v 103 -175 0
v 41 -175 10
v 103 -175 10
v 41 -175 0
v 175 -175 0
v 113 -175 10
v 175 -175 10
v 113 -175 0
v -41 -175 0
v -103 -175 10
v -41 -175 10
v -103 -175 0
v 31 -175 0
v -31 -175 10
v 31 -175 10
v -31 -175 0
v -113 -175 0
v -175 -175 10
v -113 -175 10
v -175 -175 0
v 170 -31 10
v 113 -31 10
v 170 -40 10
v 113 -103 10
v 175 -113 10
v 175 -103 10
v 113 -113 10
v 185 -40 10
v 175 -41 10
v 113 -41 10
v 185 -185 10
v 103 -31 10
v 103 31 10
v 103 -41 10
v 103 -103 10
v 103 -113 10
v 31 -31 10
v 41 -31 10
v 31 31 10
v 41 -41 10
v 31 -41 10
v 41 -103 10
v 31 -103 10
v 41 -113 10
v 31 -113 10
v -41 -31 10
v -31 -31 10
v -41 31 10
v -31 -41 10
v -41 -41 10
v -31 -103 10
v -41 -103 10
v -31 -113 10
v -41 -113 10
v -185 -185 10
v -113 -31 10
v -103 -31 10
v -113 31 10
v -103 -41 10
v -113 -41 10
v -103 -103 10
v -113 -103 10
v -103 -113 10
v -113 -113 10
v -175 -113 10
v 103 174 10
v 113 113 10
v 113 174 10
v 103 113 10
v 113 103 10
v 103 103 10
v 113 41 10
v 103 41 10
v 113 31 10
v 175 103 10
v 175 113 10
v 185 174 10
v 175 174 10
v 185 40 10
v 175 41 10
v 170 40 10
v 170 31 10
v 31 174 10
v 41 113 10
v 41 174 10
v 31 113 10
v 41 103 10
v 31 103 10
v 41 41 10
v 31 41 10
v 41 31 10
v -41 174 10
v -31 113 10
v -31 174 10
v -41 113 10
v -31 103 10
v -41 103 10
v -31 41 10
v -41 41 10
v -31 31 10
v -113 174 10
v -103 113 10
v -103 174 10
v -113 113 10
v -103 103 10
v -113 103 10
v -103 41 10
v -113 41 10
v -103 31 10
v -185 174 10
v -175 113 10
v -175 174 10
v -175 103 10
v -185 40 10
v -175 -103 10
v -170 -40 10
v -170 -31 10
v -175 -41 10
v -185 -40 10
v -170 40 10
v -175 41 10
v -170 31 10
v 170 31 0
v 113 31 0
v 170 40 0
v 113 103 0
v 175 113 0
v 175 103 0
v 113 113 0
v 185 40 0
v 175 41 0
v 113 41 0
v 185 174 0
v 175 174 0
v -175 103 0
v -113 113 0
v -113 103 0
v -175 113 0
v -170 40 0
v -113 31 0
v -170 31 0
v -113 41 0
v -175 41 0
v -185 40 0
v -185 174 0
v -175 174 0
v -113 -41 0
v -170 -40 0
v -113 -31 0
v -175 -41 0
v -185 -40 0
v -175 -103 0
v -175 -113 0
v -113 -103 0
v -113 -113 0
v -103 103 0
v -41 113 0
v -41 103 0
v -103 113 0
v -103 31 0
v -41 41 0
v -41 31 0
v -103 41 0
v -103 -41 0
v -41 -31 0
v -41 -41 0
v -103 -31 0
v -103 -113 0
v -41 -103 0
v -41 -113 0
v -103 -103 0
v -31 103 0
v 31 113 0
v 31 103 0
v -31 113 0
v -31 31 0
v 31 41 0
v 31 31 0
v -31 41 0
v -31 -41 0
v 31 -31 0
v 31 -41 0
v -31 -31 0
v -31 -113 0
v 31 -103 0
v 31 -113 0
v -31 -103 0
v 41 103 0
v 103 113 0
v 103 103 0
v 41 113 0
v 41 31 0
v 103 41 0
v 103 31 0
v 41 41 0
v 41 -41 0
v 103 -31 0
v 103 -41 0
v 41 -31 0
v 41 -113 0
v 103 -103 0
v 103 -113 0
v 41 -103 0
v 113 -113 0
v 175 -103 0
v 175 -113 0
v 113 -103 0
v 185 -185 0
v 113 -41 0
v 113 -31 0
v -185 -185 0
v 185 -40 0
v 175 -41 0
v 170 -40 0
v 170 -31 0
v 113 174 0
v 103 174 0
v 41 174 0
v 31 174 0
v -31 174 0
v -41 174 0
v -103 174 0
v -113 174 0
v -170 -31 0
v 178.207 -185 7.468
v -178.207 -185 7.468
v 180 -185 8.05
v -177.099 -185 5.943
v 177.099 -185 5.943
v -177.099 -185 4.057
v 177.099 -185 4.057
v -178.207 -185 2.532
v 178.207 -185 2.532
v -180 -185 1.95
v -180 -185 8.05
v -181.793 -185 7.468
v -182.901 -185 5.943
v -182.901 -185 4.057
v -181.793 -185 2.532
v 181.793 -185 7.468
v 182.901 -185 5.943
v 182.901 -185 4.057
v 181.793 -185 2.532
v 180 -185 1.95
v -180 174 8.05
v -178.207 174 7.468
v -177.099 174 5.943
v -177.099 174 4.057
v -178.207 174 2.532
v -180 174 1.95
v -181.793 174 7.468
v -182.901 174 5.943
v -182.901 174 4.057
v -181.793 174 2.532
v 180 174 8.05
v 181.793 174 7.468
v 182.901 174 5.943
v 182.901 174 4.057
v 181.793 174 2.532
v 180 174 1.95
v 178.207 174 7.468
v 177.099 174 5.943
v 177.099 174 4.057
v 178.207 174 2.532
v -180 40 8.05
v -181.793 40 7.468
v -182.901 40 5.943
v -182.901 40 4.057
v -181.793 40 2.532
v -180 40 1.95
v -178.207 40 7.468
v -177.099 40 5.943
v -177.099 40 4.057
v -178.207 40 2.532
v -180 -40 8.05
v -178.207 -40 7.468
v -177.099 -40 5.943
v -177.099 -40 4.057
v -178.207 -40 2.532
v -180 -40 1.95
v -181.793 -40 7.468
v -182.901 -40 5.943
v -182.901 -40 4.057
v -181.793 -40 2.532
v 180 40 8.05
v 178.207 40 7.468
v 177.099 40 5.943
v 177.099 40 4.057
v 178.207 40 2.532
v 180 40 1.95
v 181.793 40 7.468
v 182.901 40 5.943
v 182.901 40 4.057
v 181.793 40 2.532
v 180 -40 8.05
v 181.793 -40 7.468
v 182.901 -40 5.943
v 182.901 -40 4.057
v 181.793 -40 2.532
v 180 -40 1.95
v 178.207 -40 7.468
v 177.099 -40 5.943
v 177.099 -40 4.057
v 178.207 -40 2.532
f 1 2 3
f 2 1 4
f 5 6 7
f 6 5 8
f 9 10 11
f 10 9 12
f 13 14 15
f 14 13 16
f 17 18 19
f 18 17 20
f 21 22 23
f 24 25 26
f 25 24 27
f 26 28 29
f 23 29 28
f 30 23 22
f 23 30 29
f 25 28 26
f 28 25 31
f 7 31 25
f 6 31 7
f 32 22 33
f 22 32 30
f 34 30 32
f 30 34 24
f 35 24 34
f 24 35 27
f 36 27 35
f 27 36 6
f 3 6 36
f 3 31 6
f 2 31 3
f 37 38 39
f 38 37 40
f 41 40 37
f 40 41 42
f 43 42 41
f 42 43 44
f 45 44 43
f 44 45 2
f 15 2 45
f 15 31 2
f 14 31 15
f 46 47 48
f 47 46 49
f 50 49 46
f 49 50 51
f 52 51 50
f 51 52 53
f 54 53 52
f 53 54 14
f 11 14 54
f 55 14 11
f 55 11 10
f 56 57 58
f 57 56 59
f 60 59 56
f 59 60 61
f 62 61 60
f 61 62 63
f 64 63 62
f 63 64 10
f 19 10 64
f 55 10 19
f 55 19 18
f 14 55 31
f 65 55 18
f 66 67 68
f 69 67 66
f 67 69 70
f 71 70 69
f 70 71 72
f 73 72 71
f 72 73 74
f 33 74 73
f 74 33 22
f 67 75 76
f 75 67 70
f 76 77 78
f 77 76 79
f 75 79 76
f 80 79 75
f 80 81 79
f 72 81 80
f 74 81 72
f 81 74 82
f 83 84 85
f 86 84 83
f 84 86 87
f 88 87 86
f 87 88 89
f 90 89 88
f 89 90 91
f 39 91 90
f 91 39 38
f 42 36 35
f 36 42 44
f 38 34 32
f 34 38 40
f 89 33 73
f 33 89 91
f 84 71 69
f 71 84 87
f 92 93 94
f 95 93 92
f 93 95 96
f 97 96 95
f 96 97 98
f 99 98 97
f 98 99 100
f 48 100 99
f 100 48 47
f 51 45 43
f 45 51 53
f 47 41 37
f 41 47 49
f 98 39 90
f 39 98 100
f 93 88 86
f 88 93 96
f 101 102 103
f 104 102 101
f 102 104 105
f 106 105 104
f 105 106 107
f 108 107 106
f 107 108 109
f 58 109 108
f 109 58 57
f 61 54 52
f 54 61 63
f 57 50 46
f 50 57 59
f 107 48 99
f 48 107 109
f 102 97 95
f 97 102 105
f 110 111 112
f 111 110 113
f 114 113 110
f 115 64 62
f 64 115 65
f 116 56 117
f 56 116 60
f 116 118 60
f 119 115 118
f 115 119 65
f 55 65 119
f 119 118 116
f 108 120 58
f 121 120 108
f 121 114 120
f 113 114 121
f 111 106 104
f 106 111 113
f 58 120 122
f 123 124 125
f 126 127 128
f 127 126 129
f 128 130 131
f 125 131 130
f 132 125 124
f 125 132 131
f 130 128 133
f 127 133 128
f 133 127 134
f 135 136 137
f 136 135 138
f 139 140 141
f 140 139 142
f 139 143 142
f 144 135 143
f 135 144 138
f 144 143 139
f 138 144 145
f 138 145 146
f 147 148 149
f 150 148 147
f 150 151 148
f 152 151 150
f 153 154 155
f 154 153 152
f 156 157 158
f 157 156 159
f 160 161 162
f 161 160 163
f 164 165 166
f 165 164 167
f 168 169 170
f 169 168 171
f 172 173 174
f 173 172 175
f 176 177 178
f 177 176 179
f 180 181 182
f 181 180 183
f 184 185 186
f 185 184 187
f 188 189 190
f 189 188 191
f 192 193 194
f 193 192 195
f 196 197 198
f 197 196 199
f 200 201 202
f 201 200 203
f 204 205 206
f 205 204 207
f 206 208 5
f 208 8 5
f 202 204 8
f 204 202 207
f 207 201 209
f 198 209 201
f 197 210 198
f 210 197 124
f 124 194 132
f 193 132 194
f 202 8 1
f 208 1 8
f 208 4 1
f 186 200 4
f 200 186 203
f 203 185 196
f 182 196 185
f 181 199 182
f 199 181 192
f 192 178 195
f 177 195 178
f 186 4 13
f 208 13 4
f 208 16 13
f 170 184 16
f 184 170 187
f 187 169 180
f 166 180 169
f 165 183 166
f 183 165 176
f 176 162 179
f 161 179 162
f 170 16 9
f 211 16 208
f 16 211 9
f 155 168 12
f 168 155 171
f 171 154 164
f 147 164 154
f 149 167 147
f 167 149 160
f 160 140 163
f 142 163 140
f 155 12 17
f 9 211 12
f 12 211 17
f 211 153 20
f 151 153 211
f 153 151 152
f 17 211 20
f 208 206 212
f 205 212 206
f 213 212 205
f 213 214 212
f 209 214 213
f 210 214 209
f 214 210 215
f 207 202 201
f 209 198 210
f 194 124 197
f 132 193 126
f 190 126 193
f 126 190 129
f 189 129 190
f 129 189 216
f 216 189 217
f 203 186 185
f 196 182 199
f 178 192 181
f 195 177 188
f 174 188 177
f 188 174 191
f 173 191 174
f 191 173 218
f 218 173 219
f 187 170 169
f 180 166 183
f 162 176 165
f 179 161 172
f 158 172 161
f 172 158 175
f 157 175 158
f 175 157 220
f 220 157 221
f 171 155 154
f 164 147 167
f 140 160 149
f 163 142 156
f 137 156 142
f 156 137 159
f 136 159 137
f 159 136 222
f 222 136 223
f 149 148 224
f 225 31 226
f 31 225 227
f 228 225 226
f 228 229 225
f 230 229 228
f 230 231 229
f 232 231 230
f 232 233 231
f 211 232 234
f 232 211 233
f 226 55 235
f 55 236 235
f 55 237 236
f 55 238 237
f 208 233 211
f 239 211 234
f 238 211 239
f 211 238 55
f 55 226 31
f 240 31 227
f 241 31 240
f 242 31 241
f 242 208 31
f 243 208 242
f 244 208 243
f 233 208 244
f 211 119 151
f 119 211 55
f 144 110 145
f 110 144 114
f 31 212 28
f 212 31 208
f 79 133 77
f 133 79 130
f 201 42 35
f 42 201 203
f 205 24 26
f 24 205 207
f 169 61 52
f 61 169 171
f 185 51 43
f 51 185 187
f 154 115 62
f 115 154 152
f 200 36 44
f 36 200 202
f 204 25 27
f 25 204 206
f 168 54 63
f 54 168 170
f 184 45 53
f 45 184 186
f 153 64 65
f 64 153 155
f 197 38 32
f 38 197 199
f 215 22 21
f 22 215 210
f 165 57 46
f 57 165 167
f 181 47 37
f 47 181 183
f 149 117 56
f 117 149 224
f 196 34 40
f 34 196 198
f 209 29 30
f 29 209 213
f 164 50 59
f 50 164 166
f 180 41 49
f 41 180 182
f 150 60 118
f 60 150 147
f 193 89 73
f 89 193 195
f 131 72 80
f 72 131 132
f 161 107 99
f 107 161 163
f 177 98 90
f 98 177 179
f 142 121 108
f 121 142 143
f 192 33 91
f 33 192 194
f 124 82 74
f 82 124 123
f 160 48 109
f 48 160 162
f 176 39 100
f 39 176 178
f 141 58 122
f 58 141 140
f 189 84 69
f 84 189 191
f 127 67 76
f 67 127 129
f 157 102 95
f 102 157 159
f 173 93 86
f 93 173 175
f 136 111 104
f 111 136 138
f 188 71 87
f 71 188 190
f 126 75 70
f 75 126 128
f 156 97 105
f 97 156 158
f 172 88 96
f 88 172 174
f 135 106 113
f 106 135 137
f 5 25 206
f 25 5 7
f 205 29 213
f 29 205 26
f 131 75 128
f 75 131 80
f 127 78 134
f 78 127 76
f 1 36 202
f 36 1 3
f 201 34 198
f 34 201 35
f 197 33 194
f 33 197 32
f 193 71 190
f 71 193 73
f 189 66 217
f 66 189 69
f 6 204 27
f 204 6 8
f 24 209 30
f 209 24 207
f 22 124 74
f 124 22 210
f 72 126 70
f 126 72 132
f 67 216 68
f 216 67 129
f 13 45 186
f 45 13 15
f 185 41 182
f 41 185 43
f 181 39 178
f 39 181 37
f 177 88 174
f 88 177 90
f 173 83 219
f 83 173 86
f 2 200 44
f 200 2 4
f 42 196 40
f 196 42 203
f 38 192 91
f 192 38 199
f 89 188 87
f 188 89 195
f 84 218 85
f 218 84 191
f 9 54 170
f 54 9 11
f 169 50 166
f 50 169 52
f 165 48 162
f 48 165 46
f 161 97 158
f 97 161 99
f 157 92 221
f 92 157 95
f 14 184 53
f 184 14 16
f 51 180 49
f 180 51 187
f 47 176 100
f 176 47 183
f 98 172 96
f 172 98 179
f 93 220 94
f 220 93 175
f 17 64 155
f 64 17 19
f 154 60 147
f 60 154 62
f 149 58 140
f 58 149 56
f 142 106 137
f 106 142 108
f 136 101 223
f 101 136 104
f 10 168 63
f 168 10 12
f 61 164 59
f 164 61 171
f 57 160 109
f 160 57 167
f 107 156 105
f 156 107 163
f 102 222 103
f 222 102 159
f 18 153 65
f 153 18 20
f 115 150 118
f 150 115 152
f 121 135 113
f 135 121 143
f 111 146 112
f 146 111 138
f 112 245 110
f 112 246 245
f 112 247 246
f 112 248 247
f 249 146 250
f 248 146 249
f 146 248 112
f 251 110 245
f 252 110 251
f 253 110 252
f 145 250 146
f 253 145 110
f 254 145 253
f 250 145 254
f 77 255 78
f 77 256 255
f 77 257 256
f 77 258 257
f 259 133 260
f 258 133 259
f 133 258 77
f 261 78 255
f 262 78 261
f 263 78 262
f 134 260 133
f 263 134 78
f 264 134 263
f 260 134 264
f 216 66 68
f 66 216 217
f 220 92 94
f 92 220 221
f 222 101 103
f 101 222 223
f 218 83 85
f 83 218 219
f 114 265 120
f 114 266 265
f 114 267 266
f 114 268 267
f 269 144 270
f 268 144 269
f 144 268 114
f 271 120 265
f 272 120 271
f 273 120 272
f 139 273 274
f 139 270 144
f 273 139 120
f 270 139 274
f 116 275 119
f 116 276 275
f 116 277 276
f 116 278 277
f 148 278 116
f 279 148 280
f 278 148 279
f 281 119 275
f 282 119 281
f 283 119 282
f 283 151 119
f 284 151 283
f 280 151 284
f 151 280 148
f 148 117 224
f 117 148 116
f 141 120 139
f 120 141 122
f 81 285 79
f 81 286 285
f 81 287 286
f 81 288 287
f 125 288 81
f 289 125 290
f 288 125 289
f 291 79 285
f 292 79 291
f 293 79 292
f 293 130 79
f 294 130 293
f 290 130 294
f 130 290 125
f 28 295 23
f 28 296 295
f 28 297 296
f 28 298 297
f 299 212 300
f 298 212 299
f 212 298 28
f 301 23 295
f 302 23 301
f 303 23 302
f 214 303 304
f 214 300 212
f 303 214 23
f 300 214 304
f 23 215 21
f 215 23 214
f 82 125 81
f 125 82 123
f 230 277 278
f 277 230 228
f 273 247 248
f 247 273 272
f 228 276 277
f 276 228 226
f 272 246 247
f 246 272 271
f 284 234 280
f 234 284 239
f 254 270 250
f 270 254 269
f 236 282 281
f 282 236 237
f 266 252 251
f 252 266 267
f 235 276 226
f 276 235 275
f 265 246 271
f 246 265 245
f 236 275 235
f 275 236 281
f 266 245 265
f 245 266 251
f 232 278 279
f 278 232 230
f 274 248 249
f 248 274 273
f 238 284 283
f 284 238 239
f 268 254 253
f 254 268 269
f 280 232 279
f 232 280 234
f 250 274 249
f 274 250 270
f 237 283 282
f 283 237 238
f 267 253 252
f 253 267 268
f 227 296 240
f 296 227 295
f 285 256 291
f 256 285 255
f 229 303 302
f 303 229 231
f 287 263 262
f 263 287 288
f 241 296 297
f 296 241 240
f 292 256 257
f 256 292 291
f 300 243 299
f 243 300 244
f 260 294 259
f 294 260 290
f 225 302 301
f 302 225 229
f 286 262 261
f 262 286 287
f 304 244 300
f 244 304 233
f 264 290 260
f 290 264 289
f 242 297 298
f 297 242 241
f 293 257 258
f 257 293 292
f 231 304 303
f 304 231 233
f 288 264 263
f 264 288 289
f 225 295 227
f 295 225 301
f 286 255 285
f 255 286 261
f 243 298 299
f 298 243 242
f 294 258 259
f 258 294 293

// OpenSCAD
rotate([0, 0, 90]) translate([0, 0, 5]) difference()
{
  union()
  {
    for(x = [-370 / 2 + 5:72:220])
    {
      translate([x, 0, 0]) cube([10, 370, 10], center = true);
    }

    for(y = [-370 / 2 + 5:72:220])
    {
      translate([0, y, 0]) cube([370, 10, 10], center = true);
    }
  }

  translate([364, 0, 0]) cube([380, 380, 20], center = true);

  translate([0, 220, 0]) cube([80, 100, 20], center = true);
  translate([0, -220, 0]) cube([80, 100, 20], center = true);

  translate([0, 180, 0]) rotate([0, 90, 0]) cylinder(h = 1000, d = 6.1, center = true);
  translate([0, -180, 0]) rotate([0, 90, 0]) cylinder(h = 1000, d = 6.1, center = true);
}
